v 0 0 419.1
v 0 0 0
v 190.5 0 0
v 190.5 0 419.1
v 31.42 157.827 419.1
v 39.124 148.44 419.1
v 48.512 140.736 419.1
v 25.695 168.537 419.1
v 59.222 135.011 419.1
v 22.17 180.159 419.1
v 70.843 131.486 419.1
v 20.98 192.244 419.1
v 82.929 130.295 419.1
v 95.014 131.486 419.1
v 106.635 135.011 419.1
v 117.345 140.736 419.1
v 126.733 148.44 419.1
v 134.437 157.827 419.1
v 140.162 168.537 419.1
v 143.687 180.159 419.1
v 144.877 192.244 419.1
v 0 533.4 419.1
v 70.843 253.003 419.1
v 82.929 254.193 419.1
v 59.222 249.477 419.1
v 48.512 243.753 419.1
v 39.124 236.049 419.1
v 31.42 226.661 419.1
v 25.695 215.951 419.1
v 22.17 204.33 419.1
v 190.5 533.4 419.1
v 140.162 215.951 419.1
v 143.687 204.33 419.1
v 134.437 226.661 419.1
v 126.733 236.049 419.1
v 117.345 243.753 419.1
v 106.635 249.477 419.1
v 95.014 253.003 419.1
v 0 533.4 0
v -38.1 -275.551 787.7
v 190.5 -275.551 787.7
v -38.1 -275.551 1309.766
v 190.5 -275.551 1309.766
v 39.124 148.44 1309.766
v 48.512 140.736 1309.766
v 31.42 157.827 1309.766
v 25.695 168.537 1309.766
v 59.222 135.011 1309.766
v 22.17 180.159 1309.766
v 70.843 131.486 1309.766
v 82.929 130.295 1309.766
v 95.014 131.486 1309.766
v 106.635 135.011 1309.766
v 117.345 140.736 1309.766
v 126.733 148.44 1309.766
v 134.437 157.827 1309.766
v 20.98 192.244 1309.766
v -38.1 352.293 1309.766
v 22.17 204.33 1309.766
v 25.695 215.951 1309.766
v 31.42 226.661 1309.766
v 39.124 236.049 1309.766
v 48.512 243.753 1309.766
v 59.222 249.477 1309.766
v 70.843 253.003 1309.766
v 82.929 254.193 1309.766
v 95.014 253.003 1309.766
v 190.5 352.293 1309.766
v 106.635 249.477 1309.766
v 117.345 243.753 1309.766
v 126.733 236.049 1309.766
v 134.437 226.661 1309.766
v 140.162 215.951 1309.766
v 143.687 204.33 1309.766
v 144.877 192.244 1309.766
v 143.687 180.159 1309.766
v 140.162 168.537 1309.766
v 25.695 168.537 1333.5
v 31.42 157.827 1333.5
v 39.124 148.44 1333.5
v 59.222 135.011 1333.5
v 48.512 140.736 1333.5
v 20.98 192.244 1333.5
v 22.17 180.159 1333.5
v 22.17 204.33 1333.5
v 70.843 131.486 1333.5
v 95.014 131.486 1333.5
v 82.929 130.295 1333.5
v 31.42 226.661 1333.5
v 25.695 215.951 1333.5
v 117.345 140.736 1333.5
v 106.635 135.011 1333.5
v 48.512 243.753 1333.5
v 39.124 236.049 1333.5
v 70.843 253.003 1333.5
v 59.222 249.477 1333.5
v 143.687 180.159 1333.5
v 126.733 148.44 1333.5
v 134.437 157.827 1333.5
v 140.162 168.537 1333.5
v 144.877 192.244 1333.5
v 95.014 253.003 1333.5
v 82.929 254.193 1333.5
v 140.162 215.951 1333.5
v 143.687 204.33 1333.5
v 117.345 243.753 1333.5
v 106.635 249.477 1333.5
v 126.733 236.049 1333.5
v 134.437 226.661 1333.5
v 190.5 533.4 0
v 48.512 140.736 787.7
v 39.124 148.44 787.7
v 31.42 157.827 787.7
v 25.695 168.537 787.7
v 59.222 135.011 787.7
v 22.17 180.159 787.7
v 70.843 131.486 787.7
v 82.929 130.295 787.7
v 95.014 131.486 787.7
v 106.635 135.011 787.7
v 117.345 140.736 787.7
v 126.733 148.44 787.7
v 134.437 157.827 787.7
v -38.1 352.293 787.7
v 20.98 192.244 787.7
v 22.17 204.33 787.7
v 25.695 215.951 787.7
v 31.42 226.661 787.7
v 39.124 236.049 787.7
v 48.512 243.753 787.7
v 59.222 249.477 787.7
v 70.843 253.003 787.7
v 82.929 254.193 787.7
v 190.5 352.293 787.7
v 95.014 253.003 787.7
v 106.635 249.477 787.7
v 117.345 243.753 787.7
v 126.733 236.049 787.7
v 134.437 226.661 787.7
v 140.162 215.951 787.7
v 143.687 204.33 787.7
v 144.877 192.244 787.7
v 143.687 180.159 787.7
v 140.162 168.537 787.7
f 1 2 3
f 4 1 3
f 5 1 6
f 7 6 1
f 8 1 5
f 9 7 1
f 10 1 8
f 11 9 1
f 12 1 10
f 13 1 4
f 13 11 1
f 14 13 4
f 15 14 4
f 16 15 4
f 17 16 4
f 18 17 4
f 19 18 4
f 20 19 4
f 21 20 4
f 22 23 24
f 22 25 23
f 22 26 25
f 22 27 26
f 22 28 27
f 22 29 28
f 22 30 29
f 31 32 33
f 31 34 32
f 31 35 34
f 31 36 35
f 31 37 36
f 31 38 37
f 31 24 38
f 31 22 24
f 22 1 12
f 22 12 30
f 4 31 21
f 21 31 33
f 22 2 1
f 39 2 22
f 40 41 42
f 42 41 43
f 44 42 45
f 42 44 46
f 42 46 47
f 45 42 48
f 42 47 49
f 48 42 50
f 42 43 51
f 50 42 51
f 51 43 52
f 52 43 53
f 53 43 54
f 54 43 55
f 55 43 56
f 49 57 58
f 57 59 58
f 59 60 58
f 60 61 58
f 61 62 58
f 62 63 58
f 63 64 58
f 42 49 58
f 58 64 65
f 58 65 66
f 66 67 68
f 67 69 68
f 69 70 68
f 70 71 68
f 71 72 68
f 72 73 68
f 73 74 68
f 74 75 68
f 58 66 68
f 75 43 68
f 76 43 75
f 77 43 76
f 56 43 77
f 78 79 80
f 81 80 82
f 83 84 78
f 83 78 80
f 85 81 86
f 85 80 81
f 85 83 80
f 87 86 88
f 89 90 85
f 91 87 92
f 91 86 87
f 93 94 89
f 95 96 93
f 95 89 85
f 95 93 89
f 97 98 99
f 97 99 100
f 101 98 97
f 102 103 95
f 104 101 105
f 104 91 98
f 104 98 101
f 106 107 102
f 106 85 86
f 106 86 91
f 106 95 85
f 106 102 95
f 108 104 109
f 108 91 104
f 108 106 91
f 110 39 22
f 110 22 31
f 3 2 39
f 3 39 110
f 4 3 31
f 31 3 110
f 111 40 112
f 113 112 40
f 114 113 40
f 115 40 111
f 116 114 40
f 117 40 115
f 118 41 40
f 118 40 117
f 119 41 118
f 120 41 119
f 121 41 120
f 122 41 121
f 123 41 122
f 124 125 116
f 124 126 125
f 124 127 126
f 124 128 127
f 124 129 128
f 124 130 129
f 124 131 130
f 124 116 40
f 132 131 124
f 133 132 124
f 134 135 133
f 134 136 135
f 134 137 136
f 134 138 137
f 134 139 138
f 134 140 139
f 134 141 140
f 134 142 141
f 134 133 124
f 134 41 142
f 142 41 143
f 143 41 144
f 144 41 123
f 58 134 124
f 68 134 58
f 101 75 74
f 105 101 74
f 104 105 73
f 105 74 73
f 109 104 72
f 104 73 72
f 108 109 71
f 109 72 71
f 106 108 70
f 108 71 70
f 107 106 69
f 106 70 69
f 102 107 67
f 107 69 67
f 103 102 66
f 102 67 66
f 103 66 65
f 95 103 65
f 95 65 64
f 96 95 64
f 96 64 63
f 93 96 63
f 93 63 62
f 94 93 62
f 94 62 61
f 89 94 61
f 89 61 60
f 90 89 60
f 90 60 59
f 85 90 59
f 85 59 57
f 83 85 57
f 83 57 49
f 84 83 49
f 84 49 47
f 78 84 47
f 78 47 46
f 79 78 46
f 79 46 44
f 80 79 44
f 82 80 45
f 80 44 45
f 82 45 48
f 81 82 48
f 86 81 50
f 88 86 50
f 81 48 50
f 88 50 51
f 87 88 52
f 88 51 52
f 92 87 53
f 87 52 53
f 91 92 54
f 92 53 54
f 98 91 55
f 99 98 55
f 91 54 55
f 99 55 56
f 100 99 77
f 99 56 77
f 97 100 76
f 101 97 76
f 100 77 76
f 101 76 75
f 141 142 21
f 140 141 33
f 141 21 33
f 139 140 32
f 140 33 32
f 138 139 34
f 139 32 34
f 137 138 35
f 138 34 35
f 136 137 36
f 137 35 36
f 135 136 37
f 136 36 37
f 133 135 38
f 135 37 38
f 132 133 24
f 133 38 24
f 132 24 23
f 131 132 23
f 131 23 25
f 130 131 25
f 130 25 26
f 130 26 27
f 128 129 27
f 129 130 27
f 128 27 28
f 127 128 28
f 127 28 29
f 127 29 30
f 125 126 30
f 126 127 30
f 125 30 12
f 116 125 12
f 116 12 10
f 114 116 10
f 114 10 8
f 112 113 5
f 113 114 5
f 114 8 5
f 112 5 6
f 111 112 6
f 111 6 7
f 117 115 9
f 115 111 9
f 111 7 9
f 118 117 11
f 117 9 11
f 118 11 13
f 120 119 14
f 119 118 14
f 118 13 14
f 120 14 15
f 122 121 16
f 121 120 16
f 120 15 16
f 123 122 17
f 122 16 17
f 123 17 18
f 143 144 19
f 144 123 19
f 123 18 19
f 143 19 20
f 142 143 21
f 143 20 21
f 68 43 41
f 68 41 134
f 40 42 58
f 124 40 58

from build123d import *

# Parameters (mm, degrees)
F0_W     = 190.5
F0_H     = 533.4
F1_DEPTH = 419.1
F2_R     = 61.948807
F3_DEPTH = 914.4
F4_W     = 627.843589
F4_H     = 522.065521
F5_DEPTH = 228.6


with BuildPart() as f1:
    # F0 (on Top) → F1 (new body)
    with BuildSketch(Plane.XY):
        with Locations((95.25, 266.7)):
            Rectangle(F0_W, F0_H)
    extrude(amount=F1_DEPTH)

    # F2 (on face) → F3 (join)
    with BuildSketch(Plane.XY.offset(419.1)):
        with Locations((82.928531, 192.244217)):
            Circle(F2_R)
    extrude(amount=F3_DEPTH)

    # F4 (on face) → F5 (join)
    with BuildSketch(Plane.YZ.offset(190.5)):
        with Locations((38.371071, 1048.732937)):
            Rectangle(F4_W, F4_H)
    extrude(amount=-F5_DEPTH)


solid = f1.part
